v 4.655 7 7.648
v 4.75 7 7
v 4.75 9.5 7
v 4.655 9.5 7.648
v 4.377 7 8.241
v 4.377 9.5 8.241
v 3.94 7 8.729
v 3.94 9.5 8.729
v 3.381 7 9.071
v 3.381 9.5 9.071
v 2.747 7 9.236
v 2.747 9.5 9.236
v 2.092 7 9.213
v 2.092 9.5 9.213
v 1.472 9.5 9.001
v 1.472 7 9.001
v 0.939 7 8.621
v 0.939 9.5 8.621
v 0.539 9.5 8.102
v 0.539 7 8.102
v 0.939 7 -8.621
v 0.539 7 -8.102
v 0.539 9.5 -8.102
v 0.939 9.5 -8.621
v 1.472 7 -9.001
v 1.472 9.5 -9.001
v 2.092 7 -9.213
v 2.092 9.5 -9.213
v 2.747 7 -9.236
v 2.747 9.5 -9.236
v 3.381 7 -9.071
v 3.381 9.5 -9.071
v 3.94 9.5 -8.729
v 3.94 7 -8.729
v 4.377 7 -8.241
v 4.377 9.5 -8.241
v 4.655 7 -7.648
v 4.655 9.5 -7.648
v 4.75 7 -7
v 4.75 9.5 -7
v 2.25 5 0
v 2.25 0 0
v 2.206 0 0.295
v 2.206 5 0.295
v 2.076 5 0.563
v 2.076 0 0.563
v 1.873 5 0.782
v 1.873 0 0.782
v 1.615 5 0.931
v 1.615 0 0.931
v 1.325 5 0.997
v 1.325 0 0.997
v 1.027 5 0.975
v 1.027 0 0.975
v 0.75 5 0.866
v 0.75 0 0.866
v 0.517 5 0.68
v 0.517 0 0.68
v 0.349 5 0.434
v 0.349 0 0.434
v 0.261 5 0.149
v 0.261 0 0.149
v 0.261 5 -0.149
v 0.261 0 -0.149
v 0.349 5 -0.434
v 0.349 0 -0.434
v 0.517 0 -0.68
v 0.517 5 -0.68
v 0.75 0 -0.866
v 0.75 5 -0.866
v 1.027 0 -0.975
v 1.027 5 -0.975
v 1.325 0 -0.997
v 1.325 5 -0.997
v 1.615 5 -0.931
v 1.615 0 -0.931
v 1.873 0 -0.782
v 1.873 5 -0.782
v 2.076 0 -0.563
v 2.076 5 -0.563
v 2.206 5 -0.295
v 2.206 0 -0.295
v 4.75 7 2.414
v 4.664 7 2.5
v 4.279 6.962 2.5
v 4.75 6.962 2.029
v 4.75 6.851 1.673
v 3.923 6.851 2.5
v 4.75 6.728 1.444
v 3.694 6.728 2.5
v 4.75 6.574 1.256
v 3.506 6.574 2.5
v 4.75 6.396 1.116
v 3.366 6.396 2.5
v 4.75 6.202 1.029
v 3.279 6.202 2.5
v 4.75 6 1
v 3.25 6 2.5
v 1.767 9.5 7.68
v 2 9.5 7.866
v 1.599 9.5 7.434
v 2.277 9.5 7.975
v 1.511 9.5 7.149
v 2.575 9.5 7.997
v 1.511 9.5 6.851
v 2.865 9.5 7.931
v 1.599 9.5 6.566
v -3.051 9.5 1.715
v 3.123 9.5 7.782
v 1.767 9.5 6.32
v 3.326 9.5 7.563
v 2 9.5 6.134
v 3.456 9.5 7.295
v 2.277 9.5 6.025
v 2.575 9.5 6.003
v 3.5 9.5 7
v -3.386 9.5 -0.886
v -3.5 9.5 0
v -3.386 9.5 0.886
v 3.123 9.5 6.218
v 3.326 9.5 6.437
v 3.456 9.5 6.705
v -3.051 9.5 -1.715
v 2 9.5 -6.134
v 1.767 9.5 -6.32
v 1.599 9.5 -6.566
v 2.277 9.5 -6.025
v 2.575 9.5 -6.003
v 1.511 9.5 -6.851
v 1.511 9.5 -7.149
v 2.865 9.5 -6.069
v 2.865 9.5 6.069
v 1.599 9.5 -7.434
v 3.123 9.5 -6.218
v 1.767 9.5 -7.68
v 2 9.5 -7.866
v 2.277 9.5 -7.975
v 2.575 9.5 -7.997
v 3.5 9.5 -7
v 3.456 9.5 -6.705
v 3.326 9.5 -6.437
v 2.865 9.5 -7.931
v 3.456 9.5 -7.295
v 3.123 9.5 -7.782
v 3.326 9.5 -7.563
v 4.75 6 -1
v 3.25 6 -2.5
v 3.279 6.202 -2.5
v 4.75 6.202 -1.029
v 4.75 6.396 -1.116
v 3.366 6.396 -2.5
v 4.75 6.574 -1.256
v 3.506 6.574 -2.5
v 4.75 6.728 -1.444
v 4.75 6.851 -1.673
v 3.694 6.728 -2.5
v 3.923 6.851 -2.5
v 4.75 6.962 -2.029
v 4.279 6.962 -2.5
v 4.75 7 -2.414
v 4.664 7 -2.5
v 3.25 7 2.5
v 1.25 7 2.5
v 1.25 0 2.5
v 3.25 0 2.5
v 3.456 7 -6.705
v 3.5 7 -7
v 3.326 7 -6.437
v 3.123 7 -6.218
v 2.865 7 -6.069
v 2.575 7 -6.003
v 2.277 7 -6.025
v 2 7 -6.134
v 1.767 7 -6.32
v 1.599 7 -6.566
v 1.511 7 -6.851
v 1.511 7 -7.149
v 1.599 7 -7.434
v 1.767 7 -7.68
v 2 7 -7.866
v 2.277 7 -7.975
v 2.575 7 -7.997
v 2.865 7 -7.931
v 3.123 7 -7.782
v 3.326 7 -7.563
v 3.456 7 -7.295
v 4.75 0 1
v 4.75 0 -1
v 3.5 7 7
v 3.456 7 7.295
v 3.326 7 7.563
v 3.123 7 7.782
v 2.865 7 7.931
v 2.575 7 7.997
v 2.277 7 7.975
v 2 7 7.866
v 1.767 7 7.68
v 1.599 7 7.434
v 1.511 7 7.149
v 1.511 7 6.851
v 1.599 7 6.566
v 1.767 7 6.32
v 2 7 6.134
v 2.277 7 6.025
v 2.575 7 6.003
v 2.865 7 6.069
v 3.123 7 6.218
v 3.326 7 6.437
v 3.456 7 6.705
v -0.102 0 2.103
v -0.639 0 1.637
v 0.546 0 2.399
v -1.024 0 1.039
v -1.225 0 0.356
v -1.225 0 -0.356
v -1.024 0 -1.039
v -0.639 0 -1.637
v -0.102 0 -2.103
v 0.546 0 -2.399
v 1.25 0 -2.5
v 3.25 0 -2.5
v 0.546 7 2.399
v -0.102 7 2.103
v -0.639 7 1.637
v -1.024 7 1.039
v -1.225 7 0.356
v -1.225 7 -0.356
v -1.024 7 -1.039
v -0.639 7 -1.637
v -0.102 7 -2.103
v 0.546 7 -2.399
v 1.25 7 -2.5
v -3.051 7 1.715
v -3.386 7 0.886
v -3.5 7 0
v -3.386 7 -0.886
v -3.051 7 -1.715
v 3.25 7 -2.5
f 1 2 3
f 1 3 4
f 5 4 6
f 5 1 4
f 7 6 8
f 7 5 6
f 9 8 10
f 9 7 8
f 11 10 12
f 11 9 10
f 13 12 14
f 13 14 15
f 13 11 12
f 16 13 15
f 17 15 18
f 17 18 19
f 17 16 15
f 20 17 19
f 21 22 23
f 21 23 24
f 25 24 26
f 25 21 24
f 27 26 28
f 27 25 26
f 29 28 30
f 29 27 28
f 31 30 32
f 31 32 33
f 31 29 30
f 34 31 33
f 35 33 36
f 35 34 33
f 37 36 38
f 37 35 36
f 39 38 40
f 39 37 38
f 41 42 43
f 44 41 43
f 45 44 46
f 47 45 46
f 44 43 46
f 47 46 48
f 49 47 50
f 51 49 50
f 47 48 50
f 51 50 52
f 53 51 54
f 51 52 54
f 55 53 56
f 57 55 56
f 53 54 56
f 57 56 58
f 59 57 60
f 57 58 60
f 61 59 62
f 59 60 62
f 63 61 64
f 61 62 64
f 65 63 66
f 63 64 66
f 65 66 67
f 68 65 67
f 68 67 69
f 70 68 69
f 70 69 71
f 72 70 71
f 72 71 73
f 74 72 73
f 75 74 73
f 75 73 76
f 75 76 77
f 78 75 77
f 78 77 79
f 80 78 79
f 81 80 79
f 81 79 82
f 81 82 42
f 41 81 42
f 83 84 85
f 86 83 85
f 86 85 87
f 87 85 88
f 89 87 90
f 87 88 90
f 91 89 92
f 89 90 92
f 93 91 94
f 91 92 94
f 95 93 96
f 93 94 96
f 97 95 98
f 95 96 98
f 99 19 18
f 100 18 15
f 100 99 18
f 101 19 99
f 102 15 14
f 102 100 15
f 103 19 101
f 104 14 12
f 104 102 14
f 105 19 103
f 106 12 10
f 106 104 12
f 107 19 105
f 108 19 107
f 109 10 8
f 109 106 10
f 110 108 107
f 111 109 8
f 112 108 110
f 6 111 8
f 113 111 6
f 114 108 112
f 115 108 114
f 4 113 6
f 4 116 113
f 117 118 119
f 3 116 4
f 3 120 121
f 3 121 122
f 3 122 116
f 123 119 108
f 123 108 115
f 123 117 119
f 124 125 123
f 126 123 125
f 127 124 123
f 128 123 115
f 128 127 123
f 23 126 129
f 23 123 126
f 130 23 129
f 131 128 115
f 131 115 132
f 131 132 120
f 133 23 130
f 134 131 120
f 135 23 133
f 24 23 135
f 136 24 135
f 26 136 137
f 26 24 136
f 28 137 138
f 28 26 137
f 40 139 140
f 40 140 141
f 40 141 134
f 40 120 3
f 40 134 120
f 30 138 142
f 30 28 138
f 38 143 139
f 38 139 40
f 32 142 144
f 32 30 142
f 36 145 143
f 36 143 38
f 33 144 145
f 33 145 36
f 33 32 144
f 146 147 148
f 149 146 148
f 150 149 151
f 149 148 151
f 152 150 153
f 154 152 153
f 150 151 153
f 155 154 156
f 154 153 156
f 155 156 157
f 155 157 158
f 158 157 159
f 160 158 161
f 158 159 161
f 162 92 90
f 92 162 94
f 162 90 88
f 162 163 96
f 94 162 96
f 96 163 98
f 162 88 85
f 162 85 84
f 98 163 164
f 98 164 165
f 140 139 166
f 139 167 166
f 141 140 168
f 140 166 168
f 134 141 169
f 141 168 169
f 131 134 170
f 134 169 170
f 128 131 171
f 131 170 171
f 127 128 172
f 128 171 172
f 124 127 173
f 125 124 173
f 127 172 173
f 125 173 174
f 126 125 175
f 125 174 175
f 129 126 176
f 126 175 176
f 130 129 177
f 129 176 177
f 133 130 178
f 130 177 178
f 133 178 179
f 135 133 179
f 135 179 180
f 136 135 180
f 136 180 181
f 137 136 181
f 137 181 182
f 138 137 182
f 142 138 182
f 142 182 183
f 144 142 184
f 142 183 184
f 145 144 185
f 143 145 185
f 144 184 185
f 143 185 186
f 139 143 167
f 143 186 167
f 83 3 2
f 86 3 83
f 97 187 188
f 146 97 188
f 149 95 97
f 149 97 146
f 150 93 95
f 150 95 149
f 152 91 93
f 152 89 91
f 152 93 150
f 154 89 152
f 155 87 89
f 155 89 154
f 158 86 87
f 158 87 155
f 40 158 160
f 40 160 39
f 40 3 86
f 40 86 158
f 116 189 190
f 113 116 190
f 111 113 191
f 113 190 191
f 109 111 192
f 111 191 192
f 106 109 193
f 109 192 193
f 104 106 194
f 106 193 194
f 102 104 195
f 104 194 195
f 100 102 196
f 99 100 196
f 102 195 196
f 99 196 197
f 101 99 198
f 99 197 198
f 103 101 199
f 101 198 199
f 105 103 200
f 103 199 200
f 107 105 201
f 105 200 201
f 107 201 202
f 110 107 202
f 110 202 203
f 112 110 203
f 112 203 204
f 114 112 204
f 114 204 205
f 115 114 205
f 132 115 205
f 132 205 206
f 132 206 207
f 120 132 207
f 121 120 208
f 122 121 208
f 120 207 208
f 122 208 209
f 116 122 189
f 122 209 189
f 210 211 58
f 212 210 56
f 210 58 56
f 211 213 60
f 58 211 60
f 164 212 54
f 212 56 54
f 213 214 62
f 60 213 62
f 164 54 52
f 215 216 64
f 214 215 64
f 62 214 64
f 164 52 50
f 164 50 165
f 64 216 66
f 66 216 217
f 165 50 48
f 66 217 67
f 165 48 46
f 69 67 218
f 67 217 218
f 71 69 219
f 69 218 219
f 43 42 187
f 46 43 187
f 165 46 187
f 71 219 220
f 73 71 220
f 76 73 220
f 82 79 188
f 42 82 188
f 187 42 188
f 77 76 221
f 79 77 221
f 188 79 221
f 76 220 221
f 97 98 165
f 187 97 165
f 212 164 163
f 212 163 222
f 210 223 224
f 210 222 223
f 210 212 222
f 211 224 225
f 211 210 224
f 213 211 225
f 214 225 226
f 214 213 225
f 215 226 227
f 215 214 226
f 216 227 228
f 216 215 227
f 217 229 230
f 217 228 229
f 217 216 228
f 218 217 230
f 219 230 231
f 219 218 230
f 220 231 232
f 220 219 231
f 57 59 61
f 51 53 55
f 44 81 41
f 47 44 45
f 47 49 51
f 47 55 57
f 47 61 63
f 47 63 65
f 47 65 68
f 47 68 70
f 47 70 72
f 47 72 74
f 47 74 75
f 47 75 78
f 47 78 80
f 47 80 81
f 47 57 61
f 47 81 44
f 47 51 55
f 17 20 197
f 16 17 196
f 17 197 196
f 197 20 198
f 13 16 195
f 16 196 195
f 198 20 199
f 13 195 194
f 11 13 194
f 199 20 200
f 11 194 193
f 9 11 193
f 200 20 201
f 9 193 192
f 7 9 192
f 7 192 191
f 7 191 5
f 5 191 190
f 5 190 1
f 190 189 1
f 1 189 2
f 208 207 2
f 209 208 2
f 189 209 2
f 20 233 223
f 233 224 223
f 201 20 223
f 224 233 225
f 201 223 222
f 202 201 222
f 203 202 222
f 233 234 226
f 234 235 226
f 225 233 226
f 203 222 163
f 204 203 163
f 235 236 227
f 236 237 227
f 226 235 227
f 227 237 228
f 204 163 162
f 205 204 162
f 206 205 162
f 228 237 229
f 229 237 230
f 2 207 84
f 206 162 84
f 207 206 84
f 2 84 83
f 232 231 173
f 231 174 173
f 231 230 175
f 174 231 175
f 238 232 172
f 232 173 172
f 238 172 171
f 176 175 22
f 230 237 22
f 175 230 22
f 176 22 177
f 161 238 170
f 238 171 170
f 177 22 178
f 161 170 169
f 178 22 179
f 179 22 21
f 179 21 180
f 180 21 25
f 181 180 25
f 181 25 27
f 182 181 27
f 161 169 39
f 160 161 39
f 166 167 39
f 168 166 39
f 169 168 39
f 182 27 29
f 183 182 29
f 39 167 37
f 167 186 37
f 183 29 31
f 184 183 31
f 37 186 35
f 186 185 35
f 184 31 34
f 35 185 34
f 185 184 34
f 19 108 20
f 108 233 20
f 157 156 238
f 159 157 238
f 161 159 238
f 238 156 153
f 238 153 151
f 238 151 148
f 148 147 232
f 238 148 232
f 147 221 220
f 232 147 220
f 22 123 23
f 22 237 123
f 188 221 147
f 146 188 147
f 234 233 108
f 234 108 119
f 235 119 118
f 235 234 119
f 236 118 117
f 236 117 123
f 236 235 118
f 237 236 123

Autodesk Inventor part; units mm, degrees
ref_plane "YZ Plane" through (0, 0, 0) normal (1, 0, 0) x (0, 1, 0)
ref_plane "XZ Plane" through (0, 0, 0) normal (0, 1, 0) x (-1, 0, 0)
ref_plane "XY Plane" through (0, 0, 0) normal (0, 0, 1) x (1, 0, 0)
sketch "Sketch1" plane through (0, 0, 0) normal (0, 1, 0) x (-1, 0, 0)
  circle A0 centre (0, 0) radius 2.5
  dimension "d0" = 5
extrude "Extrusion1" add sketch "Sketch1" along normal blind 7
sketch "Sketch2" plane through (0, 7, 0) normal (0, 1, 0) x (1, 0, 0)
  circle A0 centre (0, 0) radius 2.5 projected
  circle A1 centre (0, 0) radius 3.5
  line L0 (0, 0) -> (2.5, 0)
  line L1 (2.5, 0) -> (2.5, 7)
  line L2 (2.5, 0) -> (2.5, -7)
  circle A2 centre (2.5, -7) radius 2.25
  circle A3 centre (2.5, 7) radius 2.25
  line L3 (0, 0) -> (-3.0512, -1.7147)
  line L4 (-3.0512, -1.7147) -> (0.5385, -8.1023)
  line L5 (2.5, -7) -> (0.5385, -8.1023)
  line L6 (2.5, 7) -> (0.5385, 8.1023)
  line L7 (0, 0) -> (-3.0512, 1.7147)
  line L8 (-3.0512, 1.7147) -> (0.5385, 8.1023)
  line L9 (2.5, -7) -> (4.75, -7)
  line L10 (2.5, 7) -> (4.75, 7)
  line L11 (4.75, 7) -> (4.75, -7)
  dimension "d3" = 7
  dimension "d4" = 2.5
  dimension "d5" = 7
  dimension "d6" = 7
  dimension "d7" = 4.5
  dimension "d8" = 4.5
extrude "Extrusion2" add sketch "Sketch2" along normal blind 3
sketch "Sketch4" plane through (0, 0, 0) normal (0, -1, 0) x (1, 0, 0)
  line L0 (4.75, 7) -> (4.75, -7) projected
  arc A0 (4.75, 7) -> (0.5385, 8.1023) centre (2.5, 7) ccw projected
  line L1 (-3.0512, 1.7147) -> (0.5385, 8.1023) projected
  arc A1 (-3.0512, 1.7147) -> (-3.0512, -1.7147) centre (0, 0) ccw projected
  line L2 (0.5385, -8.1023) -> (-3.0512, -1.7147) projected
  arc A2 (0.5385, -8.1023) -> (4.75, -7) centre (2.5, -7) ccw projected
  circle A3 centre (0, 0) radius 2.5 projected
extrude "Extrusion4" add sketch "Sketch4" along normal blind 3 contours L0 A2 L2 A1 L1 A0 | A3
sketch "Sketch5" plane through (0, 7, 0) normal (0, -1, 0) x (1, 0, 0)
  circle A0 centre (0, 0) radius 2.5 projected
  line L0 (4.75, -7) -> (4.75, 7) projected
  line L1 (0, 0) -> (0, 2.5)
  circle A1 centre (0, 0) radius 2.5 projected
  line L2 (4.75, -7) -> (4.75, 7) projected
  line L3 (0, 2.5) -> (4.75, 2.5)
  line L4 (4.75, 2.5) -> (4.75, -2.5)
  line L5 (4.75, -2.5) -> (0, -2.5)
  line L6 (0, -2.5) -> (0, 2.5)
  point P0 (6.25, 2.5)
  point P1 (4.75, 7.3386)
  point P2 (4.75, 2.5)
extrude "Extrusion5" add sketch "Sketch5" along normal up to surface (7 mm away) contours A0 L3 L0 L5
sketch "Sketch7" plane through (0, -3, 0) normal (0, -1, 0) x (1, 0, 0)
  arc A0 (0.5385, -8.1023) -> (4.75, -7) centre (2.5, -7) ccw projected
  line L0 (4.75, -7) -> (4.75, 7) projected
  arc A1 (4.75, 7) -> (0.5385, 8.1023) centre (2.5, 7) ccw projected
  line L1 (0.5385, 8.1023) -> (-3.0512, 1.7147) projected
  arc A2 (-3.0512, 1.7147) -> (-3.0512, -1.7147) centre (0, 0) ccw projected
  line L2 (-3.0512, -1.7147) -> (0.5385, -8.1023) projected
  circle A3 centre (2.5, -7) radius 1
  circle A4 centre (2.5, 7) radius 1
  dimension "d27" = 2
  dimension "d28" = 2
extrude "Extrusion7" cut sketch "Sketch7" against normal up to surface (13 mm away) contours A3 | A4
thicken "Thicken1" operation add thickness 0.5 both sides no extend neighbours yes toward (0, 1, 0) faces at (0.73, -3, -0.5716)
thicken "Thicken2" operation add thickness 0.5 both sides no extend neighbours yes toward (0, -1, 0) faces at (0.73, 10, 0.5716)
sketch "Sketch8" plane through (0, 0, 0) normal (0, 1, 0) x (1, 0, 0)
  arc A0 (0, 2.5) -> (0, -2.5) centre (0, 0) ccw projected
  line L0 (0, 0) -> (1.5, 0)
  circle A1 centre (1.5, 0) radius 2.5
  line L1 (0, 2.5) -> (4.75, 2.5) projected
  line L2 (4.75, -2.5) -> (0, -2.5) projected
  line L3 (1.5, 0) -> (1.5, 2.5)
  line L4 (1.5, 2.5) -> (0, 2.5)
  line L5 (1.5, 0) -> (1.375, -2.5)
  line L6 (1.375, -2.5) -> (0, -2.5)
  line L7 (0, -2.5) -> (1.5, -2.5)
  line L8 (1.5, -2.5) -> (1.5, 2.5)
  line L9 (1.5, 2.5) -> (0, 2.5)
  line L10 (0, 2.5) -> (0, -2.5)
  point P0 (2.75, 2.5)
  point P1 (2.75, -2.5)
  point P2 (1.3752, -2.4969)
  point P3 (3.75, 2.5)
  point P4 (3.75, -2.5)
  dimension "d36" = 5
  dimension "d35" = 1.5
extrude "Extrusion8" cut sketch "Sketch8" along normal up to surface (7 mm away) contours L10 A1 A0 | L1 A1 L10 | L10 A1 L5 L2
sketch "Sketch11" plane through (0, 7, 0) normal (0, -1, 0) x (1, 0, 0)
  circle A0 centre (2.5, 7) radius 1 projected
  circle A1 centre (2.5, -7) radius 1 projected
  line L0 (-3.0512, 1.7147) -> (0.5385, 8.1023) projected
  arc A2 (4.75, 7) -> (0.5385, 8.1023) centre (2.5, 7) ccw projected
  line L1 (4.75, 7) -> (4.75, -7) projected
  arc A3 (0.5385, -8.1023) -> (4.75, -7) centre (2.5, -7) ccw projected
  line L2 (0.5385, -8.1023) -> (-3.0512, -1.7147) projected
  arc A4 (-3.0512, 1.7147) -> (-3.0512, -1.7147) centre (0, 0) ccw projected
extrude "Extrusion9" cut sketch "Sketch11" along normal up to surface (7 mm away)
sketch "Sketch12" plane through (0, 0, 0) normal (0, 1, 0) x (1, 0, 0)
  circle A0 centre (2.5, -7) radius 1 projected
  circle A1 centre (2.5, 7) radius 1 projected
  line L0 (4.75, 7) -> (4.75, -7) projected
  arc A2 (4.75, 7) -> (0.5385, 8.1023) centre (2.5, 7) ccw projected
  line L1 (-3.0512, 1.7147) -> (0.5385, 8.1023) projected
  arc A3 (-3.0512, 1.7147) -> (-3.0512, -1.7147) centre (0, 0) ccw projected
  line L2 (0.5385, -8.1023) -> (-3.0512, -1.7147) projected
  arc A4 (0.5385, -8.1023) -> (4.75, -7) centre (2.5, -7) ccw projected
  line L3 (4.75, 7) -> (4.75, -7) projected
  line L4 (4.75, 0) -> (3.75, 0)
  line L5 (3.75, 0) -> (1.25, 0)
  circle A5 centre (1.25, 0) radius 2.5
  line L6 (1.25, 0) -> (1.25, -2.5)
  line L7 (1.25, -2.5) -> (4.75, -2.5)
  line L8 (4.75, -2.5) -> (4.75, 2.5)
  line L9 (4.75, 2.5) -> (1.25, 2.5)
  line L10 (1.25, 2.5) -> (1.25, -2.5)
  point P0 (4.75, 2.5)
  dimension "d45" = 1
  dimension "d46" = 2.5
  dimension "d47" = 5
  dimension "d48" = 3.5
  dimension "d49" = 5
extrude "Extrusion10" add sketch "Sketch12" along normal up to surface (7 mm away) contours L0 L4 A5 L9 | L0 L7 A5 L4 | L10 L6 A5 | A5 L5 L10 | A5 L6 L5
chamfer "Chamfer2" distance 1.5 angle 45 2 edges at (4.75, 3.5, 2.5) (4.75, 3.5, -2.5)
sketch "Sketch13" plane through (0, 0, 0) normal (0, 1, 0) x (1, 0, 0)
  circle A0 centre (2.5, -7) radius 1 projected
  circle A1 centre (2.5, 7) radius 1 projected
  line L0 (-3.0512, 1.7147) -> (0.5385, 8.1023) projected
  arc A2 (4.75, 7) -> (0.5385, 8.1023) centre (2.5, 7) ccw projected
  line L1 (4.75, 7) -> (4.75, -7) projected
  arc A3 (0.5385, -8.1023) -> (4.75, -7) centre (2.5, -7) ccw projected
  line L2 (0.5385, -8.1023) -> (-3.0512, -1.7147) projected
  arc A4 (-3.0512, 1.7147) -> (-3.0512, -1.7147) centre (0, 0) ccw projected
extrude "Extrusion11" cut sketch "Sketch13" against normal blind 10
sketch "Sketch14" plane through (0, 0, 0) normal (0, -1, 0) x (1, 0, 0)
  line L0 (4.75, -1) -> (3.25, -2.5) projected
  line L1 (4.75, 1) -> (4.75, -1) projected
  line L2 (3.25, 2.5) -> (4.75, 1) projected
  line L3 (3.25, 2.5) -> (1.25, 2.5) projected
  arc A0 (1.25, 2.5) -> (1.25, -2.5) centre (1.25, 0) ccw projected
  line L4 (1.25, -2.5) -> (3.25, -2.5) projected
  circle A1 centre (1.25, 0) radius 1
  point P0 (0, 0)
  dimension "d58" = 2
extrude "Extrusion12" cut sketch "Sketch14" against normal blind 5 contours A1
fillet "Fillet3" radius 1 2 edges at (4, 7, -1.75) (4, 7, 1.75)
properties part number "belt_tendor_1"
